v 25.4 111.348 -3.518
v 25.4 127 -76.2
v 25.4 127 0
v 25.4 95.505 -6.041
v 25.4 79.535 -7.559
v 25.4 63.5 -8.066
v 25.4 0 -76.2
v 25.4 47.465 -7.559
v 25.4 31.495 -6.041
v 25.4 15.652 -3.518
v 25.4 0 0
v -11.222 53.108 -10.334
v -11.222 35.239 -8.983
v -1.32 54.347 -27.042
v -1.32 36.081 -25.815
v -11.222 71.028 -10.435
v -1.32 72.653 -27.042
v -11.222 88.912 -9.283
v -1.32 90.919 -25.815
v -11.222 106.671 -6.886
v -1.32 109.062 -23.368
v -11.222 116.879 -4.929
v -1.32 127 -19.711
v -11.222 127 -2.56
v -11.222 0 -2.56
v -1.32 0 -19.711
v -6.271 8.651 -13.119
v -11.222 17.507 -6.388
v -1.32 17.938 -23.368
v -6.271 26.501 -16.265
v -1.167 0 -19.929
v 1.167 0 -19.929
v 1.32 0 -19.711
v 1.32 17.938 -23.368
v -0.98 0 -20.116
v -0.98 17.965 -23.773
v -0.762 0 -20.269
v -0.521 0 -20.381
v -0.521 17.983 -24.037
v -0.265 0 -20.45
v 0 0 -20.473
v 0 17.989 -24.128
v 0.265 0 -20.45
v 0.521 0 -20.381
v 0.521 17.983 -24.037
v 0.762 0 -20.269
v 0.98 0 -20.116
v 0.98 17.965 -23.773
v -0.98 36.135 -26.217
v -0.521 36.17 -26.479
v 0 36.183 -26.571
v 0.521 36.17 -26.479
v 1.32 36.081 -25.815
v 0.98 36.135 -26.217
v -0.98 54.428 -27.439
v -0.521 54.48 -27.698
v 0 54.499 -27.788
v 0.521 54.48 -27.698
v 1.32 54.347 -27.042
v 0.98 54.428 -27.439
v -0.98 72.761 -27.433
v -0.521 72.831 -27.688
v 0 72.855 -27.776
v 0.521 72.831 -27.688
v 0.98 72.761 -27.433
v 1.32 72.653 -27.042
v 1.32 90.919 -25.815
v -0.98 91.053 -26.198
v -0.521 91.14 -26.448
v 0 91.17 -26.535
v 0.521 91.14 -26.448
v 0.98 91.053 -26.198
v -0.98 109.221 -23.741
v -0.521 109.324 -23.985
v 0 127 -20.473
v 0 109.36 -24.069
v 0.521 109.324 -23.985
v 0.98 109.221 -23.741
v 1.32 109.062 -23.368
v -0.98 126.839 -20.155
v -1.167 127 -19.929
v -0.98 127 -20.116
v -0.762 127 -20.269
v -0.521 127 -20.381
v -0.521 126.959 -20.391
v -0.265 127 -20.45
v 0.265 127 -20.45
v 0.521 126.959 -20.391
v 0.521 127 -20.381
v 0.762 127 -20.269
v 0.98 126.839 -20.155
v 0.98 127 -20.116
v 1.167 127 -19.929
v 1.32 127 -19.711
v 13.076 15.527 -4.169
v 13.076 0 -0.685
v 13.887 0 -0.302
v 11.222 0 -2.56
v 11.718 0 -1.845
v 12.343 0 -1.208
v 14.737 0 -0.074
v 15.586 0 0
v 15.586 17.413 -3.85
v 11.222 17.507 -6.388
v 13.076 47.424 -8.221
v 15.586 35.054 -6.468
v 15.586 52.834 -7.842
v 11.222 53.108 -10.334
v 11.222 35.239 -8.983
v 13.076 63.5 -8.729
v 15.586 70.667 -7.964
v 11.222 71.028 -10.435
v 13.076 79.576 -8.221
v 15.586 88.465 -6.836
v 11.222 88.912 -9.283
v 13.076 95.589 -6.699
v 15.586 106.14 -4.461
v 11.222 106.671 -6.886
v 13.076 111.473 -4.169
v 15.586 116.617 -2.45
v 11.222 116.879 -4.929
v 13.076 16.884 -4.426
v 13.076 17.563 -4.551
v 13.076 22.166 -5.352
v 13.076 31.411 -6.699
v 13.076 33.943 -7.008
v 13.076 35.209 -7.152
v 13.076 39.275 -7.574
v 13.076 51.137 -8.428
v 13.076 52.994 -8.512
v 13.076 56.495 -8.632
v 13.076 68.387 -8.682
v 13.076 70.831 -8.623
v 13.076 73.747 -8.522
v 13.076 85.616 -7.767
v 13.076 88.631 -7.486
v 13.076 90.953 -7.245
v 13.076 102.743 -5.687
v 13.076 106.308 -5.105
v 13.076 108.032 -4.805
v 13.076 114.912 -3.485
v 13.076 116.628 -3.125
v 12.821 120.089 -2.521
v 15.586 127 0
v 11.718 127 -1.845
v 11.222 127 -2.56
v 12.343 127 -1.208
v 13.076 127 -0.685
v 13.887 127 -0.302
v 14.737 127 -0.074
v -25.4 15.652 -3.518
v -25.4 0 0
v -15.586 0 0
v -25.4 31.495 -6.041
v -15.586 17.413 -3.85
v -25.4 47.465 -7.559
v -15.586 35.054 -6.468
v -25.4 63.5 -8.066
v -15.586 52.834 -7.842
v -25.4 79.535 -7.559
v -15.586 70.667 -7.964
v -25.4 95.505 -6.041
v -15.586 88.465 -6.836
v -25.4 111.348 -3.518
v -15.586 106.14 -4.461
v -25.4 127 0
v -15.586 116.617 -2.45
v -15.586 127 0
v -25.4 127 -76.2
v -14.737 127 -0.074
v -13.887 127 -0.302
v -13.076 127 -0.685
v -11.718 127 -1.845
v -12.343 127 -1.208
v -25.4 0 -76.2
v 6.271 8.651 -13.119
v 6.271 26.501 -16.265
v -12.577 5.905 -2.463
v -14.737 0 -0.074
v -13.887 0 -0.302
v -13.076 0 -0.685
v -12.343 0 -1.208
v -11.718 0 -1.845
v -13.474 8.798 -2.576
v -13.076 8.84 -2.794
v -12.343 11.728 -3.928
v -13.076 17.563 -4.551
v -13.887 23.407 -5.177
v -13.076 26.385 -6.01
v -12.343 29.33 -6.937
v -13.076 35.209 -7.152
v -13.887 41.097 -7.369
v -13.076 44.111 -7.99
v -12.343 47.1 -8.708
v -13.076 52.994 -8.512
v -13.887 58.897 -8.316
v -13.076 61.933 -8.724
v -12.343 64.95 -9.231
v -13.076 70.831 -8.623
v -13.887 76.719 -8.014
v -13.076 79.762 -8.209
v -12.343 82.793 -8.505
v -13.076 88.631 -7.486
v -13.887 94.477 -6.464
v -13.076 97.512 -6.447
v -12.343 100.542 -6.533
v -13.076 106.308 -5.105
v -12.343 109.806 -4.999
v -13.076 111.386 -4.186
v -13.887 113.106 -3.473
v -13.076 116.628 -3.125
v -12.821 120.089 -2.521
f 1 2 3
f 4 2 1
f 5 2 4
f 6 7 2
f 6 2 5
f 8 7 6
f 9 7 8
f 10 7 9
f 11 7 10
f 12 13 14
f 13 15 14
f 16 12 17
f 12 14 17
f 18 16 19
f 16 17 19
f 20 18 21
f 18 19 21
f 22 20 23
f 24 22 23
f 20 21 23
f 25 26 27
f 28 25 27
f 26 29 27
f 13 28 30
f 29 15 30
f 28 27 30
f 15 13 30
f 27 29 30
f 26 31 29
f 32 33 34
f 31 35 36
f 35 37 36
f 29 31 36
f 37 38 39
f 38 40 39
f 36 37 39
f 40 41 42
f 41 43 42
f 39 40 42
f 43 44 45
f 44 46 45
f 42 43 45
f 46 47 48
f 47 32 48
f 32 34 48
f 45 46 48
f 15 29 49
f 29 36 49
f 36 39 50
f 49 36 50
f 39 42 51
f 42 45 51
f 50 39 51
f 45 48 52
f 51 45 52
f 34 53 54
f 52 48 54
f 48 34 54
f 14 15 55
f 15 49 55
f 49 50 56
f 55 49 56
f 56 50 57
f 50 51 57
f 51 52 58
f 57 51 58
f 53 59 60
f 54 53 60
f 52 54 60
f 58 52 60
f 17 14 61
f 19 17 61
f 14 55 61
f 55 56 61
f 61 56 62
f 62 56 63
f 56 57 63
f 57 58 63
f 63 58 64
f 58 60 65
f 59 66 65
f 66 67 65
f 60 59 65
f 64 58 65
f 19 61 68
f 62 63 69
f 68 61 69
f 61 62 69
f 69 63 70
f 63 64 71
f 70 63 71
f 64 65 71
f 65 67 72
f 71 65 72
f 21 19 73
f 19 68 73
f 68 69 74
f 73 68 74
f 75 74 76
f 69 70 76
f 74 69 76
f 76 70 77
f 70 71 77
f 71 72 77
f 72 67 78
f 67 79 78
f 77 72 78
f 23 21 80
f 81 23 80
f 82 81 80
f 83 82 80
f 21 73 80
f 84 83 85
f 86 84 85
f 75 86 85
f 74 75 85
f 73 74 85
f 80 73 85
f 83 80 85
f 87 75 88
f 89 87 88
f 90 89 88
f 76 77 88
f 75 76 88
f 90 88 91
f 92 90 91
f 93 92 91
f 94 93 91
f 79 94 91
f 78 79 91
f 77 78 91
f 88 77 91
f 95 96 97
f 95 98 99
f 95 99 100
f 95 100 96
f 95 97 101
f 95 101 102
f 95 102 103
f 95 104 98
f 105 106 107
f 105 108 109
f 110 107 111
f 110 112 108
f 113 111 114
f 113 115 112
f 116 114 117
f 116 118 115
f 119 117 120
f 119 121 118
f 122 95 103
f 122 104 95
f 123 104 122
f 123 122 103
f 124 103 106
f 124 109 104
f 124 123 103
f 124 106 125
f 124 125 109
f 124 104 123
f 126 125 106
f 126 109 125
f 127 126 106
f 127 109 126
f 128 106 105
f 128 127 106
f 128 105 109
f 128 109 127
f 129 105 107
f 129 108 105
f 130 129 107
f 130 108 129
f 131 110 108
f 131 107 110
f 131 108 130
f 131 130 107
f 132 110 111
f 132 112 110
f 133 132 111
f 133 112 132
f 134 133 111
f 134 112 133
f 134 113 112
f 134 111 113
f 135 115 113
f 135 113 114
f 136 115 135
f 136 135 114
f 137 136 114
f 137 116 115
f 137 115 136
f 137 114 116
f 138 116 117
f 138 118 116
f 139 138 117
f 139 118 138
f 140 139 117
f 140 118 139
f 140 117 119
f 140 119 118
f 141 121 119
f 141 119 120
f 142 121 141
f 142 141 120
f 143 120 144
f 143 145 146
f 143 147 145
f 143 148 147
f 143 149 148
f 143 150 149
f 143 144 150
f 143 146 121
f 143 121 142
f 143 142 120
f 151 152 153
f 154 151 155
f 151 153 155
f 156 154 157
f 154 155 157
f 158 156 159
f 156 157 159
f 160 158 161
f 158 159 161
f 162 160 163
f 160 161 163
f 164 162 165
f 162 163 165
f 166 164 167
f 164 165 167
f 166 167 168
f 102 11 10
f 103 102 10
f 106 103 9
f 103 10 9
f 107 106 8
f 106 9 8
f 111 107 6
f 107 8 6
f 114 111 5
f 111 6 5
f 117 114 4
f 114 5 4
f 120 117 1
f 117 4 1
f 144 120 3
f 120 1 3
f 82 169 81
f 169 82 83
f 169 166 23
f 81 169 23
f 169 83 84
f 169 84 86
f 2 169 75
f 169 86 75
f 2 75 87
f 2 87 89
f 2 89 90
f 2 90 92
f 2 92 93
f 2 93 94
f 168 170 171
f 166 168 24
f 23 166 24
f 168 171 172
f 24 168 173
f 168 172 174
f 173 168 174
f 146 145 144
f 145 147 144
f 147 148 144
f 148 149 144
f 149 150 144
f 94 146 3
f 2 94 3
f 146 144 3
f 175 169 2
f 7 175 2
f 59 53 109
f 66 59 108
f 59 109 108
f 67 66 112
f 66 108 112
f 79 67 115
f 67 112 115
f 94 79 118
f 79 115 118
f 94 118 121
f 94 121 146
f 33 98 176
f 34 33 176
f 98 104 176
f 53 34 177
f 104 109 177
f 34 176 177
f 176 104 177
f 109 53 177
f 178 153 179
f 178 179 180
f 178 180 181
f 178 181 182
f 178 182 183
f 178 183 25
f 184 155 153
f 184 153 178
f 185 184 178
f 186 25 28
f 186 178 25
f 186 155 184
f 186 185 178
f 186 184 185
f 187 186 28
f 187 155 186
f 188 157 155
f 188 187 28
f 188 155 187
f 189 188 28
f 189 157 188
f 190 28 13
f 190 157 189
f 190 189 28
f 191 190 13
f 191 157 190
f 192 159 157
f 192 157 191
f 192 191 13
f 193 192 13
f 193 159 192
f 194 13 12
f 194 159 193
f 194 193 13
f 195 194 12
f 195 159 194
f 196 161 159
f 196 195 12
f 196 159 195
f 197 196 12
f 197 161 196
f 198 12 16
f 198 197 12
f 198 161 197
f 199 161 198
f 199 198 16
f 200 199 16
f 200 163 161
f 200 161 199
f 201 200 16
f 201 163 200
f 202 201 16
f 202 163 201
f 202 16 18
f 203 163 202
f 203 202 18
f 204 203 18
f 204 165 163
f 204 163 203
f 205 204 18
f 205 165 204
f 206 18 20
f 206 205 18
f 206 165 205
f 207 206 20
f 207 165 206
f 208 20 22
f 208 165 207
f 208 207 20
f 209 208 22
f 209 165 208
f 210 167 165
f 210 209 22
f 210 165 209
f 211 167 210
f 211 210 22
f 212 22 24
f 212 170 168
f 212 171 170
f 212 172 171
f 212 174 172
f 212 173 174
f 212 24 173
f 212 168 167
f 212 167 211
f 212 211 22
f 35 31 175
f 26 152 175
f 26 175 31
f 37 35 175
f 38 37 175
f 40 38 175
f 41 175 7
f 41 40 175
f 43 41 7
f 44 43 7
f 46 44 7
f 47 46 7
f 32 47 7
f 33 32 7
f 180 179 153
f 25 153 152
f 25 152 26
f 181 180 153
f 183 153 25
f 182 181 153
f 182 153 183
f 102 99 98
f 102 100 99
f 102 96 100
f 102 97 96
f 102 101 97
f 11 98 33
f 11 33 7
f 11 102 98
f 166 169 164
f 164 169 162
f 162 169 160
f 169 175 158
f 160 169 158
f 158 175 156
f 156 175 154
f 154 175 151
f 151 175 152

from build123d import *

# Parameters (mm, degrees)
F0_W     = 50.8
F0_H     = 76.2
F1_DEPTH = 127
F5_R     = 5.08


with BuildPart() as f1:
    # F0 (on Front) → F1 (new body)
    with BuildSketch(Plane.XZ):
        with Locations((0, -38.1)):
            Rectangle(F0_W, F0_H)
    extrude(amount=-F1_DEPTH)

    # F4: sweep along a path in F2
    with BuildLine(Plane.YZ) as f4_path:
        CenterArc((63.5, 245.9344424842), 254, 0, 360)
    # F3 (on Front) → F4 (sweep, cut)
    with BuildSketch(Plane.XZ):
        with BuildLine():
            Line((1.3198227154, -19.7110452561), (12.7, 0))
            Line((12.7, 0), (43.4110164642, 0))
            Line((43.4110164642, 0), (43.4110164642, 26.4454465359))
            Line((43.4110164642, 26.4454465359), (-29.6869948506, 26.4454465359))
            Line((-29.6869948506, 26.4454465359), (-29.6869948506, 0))
            Line((-29.6869948506, 0), (-12.7, 0))
            Line((-12.7, 0), (-1.3198227154, -19.7110452561))
            ThreePointArc((-1.3198227154, -19.7110452561), (0, -20.4730452561), (1.3198227154, -19.7110452561))
        make_face()
    sweep(path=f4_path.line, mode=Mode.SUBTRACT)

    # F5
    f5_edges = [f1.edges().sort_by_distance(p)[0] for p in [
        (-12.7, 63.5, -8.065558),
        (12.7, 63.5, -8.065558),
    ]]
    fillet(f5_edges, radius=F5_R)


solid = f1.part
